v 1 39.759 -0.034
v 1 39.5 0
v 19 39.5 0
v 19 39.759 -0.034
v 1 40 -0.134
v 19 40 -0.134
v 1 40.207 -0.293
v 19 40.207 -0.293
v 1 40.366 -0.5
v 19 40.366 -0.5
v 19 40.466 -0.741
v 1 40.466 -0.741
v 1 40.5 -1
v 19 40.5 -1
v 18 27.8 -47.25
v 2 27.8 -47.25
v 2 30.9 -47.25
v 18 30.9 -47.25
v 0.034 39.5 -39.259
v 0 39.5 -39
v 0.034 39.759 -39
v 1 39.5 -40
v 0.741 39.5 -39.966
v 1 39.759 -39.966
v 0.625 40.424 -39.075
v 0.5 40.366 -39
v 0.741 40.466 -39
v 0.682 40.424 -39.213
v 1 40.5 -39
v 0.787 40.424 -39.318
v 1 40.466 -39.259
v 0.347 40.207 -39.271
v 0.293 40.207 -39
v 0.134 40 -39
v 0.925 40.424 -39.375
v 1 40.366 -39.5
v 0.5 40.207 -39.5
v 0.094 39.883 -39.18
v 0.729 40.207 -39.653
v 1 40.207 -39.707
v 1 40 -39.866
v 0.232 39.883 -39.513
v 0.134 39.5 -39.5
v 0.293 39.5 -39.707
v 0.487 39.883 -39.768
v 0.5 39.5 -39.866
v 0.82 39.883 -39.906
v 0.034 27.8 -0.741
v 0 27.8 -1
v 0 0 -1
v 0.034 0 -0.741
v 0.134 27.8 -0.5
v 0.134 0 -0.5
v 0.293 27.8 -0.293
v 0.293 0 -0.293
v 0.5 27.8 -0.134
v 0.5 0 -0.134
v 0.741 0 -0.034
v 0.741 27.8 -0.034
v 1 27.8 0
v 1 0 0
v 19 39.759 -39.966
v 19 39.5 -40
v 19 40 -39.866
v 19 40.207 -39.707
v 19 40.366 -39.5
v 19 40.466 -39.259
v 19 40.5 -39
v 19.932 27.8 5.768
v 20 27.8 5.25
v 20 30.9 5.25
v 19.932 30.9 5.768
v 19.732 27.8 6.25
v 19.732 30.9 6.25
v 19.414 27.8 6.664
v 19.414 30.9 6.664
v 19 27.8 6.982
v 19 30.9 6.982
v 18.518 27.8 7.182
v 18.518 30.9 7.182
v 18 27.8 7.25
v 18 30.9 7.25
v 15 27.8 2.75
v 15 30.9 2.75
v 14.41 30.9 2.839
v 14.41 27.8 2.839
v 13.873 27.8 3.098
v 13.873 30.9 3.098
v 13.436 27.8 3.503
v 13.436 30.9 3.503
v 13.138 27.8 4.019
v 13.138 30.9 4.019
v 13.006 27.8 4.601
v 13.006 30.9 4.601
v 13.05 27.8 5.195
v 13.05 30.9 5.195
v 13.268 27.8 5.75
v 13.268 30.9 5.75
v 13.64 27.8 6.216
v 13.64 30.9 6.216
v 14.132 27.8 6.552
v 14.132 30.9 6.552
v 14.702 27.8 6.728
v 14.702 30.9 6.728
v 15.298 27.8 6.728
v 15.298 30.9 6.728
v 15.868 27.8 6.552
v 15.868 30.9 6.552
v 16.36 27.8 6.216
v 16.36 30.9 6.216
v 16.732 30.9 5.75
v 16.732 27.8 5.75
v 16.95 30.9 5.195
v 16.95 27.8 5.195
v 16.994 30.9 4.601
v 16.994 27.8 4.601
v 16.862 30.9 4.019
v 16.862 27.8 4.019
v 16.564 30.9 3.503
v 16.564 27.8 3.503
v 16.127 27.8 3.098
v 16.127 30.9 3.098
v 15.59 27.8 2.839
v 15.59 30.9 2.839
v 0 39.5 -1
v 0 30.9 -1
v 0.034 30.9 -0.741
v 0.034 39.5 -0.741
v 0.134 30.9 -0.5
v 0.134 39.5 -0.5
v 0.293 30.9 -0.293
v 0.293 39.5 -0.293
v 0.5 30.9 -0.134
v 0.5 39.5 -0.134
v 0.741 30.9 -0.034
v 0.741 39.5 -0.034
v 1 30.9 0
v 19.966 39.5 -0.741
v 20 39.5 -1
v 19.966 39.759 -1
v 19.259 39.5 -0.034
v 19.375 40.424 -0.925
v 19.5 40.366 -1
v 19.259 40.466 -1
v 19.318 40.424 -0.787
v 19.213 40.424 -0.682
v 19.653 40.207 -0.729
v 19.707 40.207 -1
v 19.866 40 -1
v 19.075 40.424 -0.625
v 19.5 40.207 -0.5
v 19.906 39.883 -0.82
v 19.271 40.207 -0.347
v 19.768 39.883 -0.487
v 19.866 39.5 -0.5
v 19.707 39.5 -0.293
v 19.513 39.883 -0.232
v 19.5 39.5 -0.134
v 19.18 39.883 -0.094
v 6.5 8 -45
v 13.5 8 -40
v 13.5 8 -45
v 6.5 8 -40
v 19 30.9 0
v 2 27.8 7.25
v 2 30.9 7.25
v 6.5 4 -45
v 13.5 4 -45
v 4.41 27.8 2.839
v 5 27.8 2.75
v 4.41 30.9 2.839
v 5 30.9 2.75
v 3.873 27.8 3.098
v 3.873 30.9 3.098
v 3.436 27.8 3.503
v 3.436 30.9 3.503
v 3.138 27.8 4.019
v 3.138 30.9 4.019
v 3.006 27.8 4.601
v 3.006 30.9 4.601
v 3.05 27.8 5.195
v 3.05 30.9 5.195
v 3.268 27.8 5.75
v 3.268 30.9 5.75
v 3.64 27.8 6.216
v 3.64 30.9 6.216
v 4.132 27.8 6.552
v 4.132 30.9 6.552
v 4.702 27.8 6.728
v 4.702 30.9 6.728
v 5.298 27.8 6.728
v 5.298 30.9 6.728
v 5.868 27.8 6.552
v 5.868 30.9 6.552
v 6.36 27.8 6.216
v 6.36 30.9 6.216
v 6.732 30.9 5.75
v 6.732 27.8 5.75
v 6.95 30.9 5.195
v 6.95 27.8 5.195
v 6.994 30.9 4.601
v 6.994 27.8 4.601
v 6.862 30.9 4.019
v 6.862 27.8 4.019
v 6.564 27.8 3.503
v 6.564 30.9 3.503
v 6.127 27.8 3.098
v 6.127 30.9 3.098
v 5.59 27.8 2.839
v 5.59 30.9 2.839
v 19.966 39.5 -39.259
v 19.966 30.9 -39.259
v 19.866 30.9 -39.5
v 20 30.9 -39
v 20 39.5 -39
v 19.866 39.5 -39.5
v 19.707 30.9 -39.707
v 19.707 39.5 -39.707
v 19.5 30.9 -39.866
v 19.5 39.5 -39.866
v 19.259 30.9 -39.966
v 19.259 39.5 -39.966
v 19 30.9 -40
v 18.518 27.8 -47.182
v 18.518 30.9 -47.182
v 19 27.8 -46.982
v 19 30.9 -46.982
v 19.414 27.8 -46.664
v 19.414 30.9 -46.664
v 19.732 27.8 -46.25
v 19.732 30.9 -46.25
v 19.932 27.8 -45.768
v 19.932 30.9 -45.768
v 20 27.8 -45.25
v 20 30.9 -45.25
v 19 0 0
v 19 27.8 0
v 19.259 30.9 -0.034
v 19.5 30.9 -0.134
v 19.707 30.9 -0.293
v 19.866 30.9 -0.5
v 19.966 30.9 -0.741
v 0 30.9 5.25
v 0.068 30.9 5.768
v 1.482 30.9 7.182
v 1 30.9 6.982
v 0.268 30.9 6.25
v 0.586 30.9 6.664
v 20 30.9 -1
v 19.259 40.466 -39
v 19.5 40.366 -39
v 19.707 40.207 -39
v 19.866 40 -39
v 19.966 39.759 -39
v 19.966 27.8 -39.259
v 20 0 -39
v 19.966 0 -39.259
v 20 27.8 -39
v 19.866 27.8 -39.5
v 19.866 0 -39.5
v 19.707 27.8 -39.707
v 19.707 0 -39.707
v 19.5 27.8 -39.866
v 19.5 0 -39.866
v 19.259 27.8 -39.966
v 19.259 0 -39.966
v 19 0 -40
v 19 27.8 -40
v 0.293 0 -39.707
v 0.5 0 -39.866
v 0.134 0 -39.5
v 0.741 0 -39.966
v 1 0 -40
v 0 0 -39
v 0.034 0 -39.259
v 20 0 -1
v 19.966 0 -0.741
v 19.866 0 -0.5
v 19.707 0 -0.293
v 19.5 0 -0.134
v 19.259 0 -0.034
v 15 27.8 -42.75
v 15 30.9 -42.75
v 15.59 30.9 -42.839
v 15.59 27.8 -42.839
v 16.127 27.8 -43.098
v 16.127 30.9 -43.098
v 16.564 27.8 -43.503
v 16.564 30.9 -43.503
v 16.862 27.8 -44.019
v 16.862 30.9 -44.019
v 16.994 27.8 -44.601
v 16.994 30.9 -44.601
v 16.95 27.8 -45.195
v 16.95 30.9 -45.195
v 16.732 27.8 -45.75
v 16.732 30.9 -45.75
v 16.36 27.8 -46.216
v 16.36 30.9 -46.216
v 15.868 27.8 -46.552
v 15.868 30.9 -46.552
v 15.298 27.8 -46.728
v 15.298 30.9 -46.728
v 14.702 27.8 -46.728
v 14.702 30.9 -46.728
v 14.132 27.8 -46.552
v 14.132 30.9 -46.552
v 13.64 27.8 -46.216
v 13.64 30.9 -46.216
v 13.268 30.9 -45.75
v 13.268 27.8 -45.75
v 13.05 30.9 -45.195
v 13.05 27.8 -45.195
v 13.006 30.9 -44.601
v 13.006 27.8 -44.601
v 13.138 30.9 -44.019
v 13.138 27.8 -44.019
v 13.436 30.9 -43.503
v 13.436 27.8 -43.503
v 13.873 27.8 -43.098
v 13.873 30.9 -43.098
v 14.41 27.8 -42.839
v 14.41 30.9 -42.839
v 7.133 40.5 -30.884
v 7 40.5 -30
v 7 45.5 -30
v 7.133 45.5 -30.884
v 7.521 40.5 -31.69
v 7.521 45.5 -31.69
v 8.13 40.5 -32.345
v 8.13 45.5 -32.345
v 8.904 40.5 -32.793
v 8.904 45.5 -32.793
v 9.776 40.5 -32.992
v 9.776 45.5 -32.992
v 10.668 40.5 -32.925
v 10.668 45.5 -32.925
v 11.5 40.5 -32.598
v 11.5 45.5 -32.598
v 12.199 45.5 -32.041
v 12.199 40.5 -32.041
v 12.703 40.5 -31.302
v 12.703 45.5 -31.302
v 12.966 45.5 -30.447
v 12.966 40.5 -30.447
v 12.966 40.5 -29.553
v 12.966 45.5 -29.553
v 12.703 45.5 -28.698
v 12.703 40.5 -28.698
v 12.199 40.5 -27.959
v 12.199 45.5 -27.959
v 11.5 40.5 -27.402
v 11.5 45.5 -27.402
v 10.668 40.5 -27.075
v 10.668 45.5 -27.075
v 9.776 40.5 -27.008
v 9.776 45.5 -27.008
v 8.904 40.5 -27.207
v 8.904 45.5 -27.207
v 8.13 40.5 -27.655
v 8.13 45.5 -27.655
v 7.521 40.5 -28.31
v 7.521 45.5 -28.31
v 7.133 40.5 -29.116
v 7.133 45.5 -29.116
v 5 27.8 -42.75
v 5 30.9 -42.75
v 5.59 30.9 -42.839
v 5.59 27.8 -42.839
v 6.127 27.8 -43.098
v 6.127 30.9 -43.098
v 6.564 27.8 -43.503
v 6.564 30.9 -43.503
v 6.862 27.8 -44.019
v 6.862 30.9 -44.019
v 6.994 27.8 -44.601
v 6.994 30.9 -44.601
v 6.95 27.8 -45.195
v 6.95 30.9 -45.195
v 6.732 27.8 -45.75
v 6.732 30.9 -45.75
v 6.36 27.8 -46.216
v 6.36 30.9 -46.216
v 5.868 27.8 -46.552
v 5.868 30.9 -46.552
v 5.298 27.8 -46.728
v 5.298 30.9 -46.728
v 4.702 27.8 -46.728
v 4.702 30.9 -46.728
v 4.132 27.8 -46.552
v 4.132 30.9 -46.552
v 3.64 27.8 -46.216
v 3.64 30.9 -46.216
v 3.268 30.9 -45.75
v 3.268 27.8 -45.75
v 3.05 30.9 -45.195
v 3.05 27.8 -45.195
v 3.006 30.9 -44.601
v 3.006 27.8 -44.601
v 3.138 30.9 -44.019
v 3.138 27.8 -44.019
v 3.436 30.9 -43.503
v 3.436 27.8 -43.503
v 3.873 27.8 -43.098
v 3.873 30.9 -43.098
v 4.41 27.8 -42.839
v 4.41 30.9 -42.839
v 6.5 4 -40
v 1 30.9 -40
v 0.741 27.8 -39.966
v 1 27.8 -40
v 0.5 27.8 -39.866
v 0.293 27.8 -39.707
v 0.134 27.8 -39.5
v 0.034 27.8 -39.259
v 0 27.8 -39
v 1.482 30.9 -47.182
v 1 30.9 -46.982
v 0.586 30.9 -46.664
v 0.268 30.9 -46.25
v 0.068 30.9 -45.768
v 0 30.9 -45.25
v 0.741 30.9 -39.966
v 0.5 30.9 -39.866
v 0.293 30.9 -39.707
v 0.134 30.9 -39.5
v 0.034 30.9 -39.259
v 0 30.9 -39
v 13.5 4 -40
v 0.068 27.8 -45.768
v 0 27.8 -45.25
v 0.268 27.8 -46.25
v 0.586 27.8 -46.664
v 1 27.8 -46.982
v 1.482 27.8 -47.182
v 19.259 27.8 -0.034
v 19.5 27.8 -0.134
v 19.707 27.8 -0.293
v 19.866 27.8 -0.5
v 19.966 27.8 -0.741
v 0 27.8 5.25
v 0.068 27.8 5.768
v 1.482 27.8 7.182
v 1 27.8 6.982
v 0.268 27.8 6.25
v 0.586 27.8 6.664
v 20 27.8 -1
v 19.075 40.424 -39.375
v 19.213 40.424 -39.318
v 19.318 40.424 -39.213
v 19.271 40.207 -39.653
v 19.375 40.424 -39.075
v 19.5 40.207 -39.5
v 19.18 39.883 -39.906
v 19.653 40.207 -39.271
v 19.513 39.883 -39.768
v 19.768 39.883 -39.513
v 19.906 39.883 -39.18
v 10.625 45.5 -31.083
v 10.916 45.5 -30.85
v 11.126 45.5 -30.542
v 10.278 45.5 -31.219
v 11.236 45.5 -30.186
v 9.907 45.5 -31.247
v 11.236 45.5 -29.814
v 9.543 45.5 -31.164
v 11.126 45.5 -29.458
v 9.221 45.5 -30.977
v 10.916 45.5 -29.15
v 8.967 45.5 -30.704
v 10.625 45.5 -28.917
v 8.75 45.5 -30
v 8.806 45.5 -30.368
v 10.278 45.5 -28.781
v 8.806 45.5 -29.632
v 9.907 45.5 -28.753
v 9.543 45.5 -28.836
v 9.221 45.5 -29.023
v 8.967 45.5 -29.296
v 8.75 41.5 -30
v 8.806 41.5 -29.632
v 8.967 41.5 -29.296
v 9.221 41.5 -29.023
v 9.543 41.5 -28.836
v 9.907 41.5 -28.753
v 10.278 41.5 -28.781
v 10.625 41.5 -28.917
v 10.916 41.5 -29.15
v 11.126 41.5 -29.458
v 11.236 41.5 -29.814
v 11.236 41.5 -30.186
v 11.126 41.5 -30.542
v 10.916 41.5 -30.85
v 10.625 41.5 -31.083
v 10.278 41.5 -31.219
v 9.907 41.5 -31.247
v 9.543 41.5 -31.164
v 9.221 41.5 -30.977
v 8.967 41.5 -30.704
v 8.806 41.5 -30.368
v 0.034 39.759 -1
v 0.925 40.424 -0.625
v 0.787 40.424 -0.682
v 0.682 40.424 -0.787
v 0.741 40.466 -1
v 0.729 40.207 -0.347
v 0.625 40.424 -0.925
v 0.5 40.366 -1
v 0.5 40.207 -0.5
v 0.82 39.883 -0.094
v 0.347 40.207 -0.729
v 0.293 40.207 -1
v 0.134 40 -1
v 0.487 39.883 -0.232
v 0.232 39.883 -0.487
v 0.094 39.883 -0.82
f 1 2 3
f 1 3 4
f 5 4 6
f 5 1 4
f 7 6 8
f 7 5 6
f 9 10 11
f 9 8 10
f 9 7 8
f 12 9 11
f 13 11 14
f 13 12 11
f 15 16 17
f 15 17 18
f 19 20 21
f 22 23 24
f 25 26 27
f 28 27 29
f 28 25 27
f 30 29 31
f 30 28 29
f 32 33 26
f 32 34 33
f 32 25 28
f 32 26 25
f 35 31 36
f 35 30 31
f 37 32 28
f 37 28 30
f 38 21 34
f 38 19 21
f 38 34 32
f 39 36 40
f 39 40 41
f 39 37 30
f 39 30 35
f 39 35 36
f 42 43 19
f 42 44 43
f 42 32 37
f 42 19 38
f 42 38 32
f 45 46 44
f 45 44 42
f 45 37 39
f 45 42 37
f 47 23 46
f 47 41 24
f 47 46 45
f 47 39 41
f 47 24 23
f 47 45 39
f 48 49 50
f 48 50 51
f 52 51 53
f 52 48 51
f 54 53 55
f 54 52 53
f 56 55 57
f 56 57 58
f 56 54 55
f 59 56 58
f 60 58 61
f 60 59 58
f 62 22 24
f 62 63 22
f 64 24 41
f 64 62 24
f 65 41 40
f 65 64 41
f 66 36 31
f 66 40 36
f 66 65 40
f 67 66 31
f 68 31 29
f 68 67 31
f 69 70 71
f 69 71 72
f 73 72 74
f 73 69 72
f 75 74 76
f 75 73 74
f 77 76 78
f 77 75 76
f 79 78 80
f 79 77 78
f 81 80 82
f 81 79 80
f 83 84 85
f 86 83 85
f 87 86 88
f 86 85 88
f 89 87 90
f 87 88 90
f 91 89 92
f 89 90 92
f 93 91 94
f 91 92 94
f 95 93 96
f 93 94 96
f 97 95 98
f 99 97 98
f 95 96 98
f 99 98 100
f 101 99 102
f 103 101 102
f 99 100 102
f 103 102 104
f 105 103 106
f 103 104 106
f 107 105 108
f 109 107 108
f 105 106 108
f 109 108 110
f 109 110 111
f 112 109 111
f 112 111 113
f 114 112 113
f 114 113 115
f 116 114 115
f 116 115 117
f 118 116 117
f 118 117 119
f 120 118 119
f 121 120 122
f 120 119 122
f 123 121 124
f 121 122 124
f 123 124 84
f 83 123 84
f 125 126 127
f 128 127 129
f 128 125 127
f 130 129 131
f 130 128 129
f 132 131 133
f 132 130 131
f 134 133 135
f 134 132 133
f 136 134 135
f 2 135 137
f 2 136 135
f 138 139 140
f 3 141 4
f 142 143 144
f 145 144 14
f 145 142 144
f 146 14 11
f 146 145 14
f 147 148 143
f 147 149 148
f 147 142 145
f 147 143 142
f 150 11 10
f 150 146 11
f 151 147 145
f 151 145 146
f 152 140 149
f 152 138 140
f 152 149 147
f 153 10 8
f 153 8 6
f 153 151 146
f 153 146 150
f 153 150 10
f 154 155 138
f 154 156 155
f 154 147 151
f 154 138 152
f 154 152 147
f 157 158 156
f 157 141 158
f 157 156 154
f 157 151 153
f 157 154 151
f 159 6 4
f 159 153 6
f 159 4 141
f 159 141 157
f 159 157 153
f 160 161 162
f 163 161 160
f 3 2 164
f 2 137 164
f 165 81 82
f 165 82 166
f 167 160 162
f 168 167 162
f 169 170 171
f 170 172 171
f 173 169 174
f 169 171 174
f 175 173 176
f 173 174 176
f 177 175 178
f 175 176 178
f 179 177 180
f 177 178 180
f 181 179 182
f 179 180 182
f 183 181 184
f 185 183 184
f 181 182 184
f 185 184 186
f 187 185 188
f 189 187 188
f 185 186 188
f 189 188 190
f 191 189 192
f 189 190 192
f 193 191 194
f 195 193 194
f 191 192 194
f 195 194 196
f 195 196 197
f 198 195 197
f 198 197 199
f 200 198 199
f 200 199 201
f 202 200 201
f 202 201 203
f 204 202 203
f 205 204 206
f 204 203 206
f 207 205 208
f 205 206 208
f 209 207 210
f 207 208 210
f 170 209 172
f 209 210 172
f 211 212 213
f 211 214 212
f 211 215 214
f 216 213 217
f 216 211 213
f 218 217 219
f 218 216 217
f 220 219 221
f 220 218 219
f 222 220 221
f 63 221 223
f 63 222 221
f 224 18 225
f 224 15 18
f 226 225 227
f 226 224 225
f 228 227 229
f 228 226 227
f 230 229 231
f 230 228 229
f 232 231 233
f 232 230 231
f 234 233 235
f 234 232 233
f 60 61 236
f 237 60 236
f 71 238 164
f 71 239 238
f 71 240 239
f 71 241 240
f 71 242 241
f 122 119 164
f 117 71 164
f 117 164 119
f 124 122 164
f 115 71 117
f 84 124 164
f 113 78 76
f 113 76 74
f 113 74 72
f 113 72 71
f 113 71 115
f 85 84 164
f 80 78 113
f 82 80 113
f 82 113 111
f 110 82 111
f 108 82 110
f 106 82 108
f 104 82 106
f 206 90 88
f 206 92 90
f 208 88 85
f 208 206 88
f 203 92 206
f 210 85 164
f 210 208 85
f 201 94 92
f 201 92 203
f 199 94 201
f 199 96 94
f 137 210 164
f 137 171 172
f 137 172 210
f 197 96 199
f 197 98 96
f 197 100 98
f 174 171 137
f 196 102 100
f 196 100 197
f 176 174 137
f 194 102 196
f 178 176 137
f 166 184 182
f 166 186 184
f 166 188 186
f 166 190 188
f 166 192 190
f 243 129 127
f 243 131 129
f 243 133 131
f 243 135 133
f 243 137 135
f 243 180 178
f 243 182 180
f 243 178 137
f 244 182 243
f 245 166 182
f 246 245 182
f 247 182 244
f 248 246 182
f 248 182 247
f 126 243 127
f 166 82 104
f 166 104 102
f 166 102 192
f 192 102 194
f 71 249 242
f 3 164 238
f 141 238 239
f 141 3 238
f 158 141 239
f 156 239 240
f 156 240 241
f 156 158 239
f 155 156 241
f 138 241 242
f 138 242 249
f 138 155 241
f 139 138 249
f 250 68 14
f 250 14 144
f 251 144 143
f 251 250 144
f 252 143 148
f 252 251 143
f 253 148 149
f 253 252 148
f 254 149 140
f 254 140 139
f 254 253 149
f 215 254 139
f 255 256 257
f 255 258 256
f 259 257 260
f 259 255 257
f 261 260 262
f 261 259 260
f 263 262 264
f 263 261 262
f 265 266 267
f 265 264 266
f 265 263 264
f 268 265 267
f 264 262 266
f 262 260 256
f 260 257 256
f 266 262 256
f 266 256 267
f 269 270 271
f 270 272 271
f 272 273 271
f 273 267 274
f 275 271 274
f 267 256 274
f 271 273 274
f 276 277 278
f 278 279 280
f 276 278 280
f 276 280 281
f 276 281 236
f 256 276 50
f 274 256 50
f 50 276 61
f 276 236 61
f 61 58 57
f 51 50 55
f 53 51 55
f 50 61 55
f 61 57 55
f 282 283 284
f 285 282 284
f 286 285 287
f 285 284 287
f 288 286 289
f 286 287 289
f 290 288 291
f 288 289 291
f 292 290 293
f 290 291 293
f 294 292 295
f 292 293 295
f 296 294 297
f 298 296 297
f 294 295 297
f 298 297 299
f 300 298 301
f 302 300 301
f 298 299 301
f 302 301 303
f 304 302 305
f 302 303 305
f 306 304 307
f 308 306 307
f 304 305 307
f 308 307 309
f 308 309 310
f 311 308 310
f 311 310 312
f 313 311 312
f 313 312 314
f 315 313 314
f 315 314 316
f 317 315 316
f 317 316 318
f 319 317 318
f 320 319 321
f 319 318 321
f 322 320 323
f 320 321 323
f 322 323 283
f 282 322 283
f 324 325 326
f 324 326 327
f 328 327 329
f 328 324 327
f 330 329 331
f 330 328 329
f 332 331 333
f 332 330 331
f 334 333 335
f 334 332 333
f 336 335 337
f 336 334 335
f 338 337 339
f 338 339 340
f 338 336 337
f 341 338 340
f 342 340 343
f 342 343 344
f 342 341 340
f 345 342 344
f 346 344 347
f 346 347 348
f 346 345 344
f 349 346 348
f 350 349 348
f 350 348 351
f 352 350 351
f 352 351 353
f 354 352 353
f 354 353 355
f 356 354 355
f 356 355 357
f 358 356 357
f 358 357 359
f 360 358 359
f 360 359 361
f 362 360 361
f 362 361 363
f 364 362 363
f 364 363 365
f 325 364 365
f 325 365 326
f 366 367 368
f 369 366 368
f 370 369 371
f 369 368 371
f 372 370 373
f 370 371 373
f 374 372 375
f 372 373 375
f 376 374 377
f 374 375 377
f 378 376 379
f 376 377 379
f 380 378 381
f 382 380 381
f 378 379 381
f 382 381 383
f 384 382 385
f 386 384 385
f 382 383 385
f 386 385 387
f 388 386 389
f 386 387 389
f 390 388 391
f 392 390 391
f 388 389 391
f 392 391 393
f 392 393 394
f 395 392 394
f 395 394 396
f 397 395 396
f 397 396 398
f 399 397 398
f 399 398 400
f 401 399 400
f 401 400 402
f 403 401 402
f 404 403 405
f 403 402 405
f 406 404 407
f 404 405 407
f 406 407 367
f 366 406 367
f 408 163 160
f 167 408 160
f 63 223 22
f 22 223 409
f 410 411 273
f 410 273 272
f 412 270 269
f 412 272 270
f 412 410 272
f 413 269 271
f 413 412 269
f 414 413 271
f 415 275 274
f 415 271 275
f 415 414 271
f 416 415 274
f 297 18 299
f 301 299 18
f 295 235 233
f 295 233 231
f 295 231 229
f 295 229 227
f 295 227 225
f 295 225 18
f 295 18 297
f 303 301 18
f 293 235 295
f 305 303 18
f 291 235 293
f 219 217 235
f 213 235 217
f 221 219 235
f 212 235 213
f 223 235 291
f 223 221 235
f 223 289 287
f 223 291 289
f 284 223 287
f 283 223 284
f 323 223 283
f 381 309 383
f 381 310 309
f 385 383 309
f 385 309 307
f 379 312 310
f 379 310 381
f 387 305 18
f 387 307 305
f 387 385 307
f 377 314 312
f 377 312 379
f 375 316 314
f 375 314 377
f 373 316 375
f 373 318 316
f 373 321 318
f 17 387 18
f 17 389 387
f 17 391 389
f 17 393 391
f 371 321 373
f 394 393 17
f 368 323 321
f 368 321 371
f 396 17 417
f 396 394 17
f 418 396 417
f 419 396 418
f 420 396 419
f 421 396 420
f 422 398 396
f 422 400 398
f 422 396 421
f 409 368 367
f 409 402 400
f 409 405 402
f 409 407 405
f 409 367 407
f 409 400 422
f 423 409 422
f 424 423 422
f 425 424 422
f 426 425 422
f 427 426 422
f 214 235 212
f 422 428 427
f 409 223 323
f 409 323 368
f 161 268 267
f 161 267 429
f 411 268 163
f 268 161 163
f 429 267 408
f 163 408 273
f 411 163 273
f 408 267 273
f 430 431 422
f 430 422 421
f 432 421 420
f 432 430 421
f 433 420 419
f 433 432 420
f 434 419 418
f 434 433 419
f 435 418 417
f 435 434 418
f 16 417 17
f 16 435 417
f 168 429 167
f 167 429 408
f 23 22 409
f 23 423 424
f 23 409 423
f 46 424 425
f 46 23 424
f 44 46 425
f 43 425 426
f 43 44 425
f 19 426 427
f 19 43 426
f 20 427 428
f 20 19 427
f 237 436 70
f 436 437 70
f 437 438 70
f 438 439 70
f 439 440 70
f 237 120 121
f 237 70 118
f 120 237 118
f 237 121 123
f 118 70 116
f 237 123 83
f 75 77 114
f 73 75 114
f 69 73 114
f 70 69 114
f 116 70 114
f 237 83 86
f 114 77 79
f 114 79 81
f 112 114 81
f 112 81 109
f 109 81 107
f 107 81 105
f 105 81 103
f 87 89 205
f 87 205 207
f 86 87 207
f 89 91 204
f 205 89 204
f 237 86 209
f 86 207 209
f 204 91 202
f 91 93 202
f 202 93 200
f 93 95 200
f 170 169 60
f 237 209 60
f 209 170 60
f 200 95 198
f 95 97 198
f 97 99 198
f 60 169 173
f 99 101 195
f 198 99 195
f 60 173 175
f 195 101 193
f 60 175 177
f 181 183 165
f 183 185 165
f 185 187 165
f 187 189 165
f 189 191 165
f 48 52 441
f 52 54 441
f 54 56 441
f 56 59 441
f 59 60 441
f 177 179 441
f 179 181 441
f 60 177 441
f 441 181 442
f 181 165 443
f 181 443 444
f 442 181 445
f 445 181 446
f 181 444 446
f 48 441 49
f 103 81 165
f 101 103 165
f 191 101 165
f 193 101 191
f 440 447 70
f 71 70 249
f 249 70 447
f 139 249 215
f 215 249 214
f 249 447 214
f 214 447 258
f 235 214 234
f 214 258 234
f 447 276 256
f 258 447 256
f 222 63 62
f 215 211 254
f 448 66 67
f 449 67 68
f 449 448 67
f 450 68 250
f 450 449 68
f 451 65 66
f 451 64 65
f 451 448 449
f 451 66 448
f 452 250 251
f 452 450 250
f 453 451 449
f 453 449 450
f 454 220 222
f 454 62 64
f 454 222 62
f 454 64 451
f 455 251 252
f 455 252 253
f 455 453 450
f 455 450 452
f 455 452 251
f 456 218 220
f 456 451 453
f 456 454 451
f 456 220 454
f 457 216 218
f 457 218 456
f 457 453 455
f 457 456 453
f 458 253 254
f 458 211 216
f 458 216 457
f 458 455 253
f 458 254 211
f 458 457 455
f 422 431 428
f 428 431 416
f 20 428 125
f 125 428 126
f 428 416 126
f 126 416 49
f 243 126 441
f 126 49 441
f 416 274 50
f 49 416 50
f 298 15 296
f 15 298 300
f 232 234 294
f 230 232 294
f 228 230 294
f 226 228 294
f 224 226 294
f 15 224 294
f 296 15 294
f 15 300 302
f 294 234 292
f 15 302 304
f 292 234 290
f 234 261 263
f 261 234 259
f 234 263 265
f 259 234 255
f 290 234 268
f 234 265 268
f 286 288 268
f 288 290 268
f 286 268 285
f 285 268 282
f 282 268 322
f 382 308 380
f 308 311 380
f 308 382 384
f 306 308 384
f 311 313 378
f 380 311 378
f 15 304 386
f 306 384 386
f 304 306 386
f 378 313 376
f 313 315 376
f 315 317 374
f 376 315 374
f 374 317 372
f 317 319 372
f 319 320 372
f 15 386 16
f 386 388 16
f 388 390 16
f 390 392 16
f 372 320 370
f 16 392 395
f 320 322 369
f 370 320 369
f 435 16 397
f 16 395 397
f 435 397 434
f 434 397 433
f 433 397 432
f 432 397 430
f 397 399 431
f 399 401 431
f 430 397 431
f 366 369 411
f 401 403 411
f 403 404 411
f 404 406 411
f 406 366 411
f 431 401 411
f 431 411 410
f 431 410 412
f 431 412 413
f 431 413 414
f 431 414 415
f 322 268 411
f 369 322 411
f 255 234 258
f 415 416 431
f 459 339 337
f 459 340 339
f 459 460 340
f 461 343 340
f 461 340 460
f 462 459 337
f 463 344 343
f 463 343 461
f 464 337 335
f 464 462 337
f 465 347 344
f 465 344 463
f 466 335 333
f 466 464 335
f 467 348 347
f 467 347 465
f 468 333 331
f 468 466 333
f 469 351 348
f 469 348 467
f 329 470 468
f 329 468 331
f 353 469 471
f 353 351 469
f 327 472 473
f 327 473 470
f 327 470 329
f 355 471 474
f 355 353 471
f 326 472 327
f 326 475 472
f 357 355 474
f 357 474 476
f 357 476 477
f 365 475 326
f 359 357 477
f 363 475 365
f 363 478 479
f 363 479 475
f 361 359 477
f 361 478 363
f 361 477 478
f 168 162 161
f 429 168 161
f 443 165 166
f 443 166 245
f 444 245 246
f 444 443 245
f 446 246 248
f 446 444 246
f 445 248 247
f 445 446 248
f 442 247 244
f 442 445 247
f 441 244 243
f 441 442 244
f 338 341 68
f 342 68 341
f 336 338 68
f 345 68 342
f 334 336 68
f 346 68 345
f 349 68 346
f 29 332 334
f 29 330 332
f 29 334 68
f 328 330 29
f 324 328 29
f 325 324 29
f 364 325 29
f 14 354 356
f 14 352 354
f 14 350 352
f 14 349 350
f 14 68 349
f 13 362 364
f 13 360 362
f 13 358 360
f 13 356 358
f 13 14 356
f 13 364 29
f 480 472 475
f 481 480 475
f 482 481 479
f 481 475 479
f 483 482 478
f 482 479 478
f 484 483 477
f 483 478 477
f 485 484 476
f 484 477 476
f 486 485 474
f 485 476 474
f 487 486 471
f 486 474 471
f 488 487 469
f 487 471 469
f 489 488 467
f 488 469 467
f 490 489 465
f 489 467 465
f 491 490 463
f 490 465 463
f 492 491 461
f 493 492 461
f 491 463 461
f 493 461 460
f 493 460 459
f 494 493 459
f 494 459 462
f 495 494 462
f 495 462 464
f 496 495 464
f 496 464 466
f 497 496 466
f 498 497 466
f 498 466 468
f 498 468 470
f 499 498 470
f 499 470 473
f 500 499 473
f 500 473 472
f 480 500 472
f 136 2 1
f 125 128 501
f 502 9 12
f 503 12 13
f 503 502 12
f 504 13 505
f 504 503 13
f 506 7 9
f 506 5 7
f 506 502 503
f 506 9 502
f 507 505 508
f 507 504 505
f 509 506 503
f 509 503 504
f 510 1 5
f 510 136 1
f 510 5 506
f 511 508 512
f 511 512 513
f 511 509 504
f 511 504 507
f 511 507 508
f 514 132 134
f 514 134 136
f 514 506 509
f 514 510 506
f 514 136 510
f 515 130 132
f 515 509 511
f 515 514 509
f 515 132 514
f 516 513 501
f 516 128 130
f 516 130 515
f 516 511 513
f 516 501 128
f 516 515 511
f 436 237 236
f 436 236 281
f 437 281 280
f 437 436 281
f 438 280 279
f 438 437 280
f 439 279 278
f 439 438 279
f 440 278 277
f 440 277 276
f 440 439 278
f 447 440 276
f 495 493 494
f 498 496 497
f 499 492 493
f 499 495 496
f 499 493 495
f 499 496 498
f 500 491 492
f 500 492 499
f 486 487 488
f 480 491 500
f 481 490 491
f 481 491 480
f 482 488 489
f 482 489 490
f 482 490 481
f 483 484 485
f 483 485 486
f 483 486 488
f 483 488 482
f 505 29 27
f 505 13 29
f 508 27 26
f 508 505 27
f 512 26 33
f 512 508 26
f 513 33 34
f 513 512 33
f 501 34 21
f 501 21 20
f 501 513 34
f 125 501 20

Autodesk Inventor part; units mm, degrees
sketch "スケッチ1" plane through (0, 0, 0) normal (0, 1, 0) x (-1, 0, 0)
  line L0 (0, 0) -> (-20, 0)
  line L1 (-20, 0) -> (-20, -40)
  line L2 (-20, -40) -> (0, -40)
  line L3 (0, -40) -> (0, 0)
  line L4 (0, -44.75) -> (-20, -44.75)
  line L5 (-20, -44.75) -> (-20, 4.75)
  line L6 (-20, 4.75) -> (0, 4.75)
  line L7 (0, 4.75) -> (0, -44.75)
  line L8 (-2, -47.25) -> (-18, -47.25)
  line L9 (-20, -45.25) -> (-20, 5.25)
  line L10 (-18, 7.25) -> (-2, 7.25)
  line L11 (0, 5.25) -> (0, -45.25)
  line L12 (-10, -61.4419) -> (-10, 22.3426)
  arc A0 (0, 5.25) -> (-2, 7.25) centre (-2, 5.25) ccw
  arc A1 (-18, 7.25) -> (-20, 5.25) centre (-18, 5.25) ccw
  arc A2 (-20, -45.25) -> (-18, -47.25) centre (-18, -45.25) ccw
  arc A3 (-2, -47.25) -> (0, -45.25) centre (-2, -45.25) ccw
  circle A4 centre (-10, -30) radius 3
  line L13 (-6.5, -45) -> (-13.5, -45)
  line L14 (-13.5, -45) -> (-13.5, -40)
  line L15 (-13.5, -40) -> (-6.5, -40)
  line L16 (-6.5, -40) -> (-6.5, -45)
  circle A5 centre (-10, -30) radius 1.25
  point P0 (-10, -20)
  point P1 (-20, 7.25)
  point P2 (-20, -47.25)
  point P3 (0, 7.25)
  point P4 (-5, 4.75)
  point P5 (-15, 4.75)
  point P6 (-20, 4.75)
  point P7 (-6.5, 0)
  point P8 (-13.5, 0)
  dimension "d0" = 20
  dimension "d1" = 40
  dimension "d2" = 20
  dimension "d3" = 49.5
  dimension "d4" = 20
  dimension "d5" = 54.5
  dimension "d6" = 24.75
  dimension "d7" = 27.25
  dimension "d8" = 10
  dimension "d9" = 0
  dimension "d10" = 0
  dimension "d11" = 4.75
  dimension "d12" = 0
  dimension "d13" = 10
  dimension "d14" = 10
  dimension "d15" = 5
  dimension "d16" = 2
  dimension "d30" = 6
  dimension "d33" = 7
  dimension "d34" = 5
  dimension "d35" = 3.5
  dimension "d42" = 2.5
  dimension "d45" = 0
extrude "押し出し1" add sketch "スケッチ1" along normal blind 40.5 contours L3 L2 L12 A4 L0 | L12 A4 L2 L1 L0 | A4 L12 A5 | L12 A5 A4 | A5 L12 | L12 A5
ref_plane "作業平面1" through (0, 27.8, 0) normal (0, -1, 0) x (1, 0, 0)
extrude "押し出し2" add sketch "スケッチ1" along normal blind 3.1 from surface at 27.8 contours L0 L12 L6 L7 | L0 L5 L6 L12 | L7 L4 L16 L2 | L6 L12 L10 A0 L11 | L6 L9 A1 L10 L12 | L16 L4 L12 L2 | L11 A3 L8 L12 L13 L16 L4 | L2 L14 L4 L5 | L12 L4 L14 L2 | L16 L13 L12 L4 | L4 L14 L13 L12 L8 A2 L9 | L12 L13 L14 L4
hole "穴1" at (5, 0, 4.75) at (15, 0, 4.75) direction (0, 1, 0) diameter 4 end through all
ref_plane "作業平面2" through (0, 40.5, -20) normal (0, 0, 1) x (1, 0, 0)
mirror "ミラー1" about plane through (0, 40.5, -20) normal (0, 0, 1) of "穴1"
extrude "押し出し3" add sketch "スケッチ1" along normal blind 5 from surface at 40.5 contours A4 L12 A5 | L12 A5 A4 | A5 L12 | L12 A5
ref_plane "作業平面3" through (0, 8, 0) normal (0, -1, 0) x (1, 0, 0)
extrude "押し出し4" add sketch "スケッチ1" against normal blind 4 from surface at 8 contours L16 L4 L12 L2 | L12 L4 L14 L2 | L16 L13 L12 L4 | L12 L13 L14 L4
fillet "フィレット1" radius 1 12 edges at (0, 35.7, 0) (0, 13.9, 0) (20, 13.9, 0) (20, 35.7, 0) (20, 13.9, -40) (20, 35.7, -40) (0, 13.9, -40) (0, 35.7, -40) (20, 40.5, -20) (0, 40.5, -20) (10, 40.5, 0) (10, 40.5, -40)
extrude "押し出し5" cut sketch "スケッチ1" against normal blind 4 from surface at 45.5 contours A5 L12 | L12 A5
equation "\"d6\" = 0.5 * d3"
equation "\"d7\" = 0.5 * d5"
equation "\"d8\" = 0.5 * d2"
equation "\"d35\" = 0.5 * d33"
properties part number "ServoMotor(20kg・cm)"
